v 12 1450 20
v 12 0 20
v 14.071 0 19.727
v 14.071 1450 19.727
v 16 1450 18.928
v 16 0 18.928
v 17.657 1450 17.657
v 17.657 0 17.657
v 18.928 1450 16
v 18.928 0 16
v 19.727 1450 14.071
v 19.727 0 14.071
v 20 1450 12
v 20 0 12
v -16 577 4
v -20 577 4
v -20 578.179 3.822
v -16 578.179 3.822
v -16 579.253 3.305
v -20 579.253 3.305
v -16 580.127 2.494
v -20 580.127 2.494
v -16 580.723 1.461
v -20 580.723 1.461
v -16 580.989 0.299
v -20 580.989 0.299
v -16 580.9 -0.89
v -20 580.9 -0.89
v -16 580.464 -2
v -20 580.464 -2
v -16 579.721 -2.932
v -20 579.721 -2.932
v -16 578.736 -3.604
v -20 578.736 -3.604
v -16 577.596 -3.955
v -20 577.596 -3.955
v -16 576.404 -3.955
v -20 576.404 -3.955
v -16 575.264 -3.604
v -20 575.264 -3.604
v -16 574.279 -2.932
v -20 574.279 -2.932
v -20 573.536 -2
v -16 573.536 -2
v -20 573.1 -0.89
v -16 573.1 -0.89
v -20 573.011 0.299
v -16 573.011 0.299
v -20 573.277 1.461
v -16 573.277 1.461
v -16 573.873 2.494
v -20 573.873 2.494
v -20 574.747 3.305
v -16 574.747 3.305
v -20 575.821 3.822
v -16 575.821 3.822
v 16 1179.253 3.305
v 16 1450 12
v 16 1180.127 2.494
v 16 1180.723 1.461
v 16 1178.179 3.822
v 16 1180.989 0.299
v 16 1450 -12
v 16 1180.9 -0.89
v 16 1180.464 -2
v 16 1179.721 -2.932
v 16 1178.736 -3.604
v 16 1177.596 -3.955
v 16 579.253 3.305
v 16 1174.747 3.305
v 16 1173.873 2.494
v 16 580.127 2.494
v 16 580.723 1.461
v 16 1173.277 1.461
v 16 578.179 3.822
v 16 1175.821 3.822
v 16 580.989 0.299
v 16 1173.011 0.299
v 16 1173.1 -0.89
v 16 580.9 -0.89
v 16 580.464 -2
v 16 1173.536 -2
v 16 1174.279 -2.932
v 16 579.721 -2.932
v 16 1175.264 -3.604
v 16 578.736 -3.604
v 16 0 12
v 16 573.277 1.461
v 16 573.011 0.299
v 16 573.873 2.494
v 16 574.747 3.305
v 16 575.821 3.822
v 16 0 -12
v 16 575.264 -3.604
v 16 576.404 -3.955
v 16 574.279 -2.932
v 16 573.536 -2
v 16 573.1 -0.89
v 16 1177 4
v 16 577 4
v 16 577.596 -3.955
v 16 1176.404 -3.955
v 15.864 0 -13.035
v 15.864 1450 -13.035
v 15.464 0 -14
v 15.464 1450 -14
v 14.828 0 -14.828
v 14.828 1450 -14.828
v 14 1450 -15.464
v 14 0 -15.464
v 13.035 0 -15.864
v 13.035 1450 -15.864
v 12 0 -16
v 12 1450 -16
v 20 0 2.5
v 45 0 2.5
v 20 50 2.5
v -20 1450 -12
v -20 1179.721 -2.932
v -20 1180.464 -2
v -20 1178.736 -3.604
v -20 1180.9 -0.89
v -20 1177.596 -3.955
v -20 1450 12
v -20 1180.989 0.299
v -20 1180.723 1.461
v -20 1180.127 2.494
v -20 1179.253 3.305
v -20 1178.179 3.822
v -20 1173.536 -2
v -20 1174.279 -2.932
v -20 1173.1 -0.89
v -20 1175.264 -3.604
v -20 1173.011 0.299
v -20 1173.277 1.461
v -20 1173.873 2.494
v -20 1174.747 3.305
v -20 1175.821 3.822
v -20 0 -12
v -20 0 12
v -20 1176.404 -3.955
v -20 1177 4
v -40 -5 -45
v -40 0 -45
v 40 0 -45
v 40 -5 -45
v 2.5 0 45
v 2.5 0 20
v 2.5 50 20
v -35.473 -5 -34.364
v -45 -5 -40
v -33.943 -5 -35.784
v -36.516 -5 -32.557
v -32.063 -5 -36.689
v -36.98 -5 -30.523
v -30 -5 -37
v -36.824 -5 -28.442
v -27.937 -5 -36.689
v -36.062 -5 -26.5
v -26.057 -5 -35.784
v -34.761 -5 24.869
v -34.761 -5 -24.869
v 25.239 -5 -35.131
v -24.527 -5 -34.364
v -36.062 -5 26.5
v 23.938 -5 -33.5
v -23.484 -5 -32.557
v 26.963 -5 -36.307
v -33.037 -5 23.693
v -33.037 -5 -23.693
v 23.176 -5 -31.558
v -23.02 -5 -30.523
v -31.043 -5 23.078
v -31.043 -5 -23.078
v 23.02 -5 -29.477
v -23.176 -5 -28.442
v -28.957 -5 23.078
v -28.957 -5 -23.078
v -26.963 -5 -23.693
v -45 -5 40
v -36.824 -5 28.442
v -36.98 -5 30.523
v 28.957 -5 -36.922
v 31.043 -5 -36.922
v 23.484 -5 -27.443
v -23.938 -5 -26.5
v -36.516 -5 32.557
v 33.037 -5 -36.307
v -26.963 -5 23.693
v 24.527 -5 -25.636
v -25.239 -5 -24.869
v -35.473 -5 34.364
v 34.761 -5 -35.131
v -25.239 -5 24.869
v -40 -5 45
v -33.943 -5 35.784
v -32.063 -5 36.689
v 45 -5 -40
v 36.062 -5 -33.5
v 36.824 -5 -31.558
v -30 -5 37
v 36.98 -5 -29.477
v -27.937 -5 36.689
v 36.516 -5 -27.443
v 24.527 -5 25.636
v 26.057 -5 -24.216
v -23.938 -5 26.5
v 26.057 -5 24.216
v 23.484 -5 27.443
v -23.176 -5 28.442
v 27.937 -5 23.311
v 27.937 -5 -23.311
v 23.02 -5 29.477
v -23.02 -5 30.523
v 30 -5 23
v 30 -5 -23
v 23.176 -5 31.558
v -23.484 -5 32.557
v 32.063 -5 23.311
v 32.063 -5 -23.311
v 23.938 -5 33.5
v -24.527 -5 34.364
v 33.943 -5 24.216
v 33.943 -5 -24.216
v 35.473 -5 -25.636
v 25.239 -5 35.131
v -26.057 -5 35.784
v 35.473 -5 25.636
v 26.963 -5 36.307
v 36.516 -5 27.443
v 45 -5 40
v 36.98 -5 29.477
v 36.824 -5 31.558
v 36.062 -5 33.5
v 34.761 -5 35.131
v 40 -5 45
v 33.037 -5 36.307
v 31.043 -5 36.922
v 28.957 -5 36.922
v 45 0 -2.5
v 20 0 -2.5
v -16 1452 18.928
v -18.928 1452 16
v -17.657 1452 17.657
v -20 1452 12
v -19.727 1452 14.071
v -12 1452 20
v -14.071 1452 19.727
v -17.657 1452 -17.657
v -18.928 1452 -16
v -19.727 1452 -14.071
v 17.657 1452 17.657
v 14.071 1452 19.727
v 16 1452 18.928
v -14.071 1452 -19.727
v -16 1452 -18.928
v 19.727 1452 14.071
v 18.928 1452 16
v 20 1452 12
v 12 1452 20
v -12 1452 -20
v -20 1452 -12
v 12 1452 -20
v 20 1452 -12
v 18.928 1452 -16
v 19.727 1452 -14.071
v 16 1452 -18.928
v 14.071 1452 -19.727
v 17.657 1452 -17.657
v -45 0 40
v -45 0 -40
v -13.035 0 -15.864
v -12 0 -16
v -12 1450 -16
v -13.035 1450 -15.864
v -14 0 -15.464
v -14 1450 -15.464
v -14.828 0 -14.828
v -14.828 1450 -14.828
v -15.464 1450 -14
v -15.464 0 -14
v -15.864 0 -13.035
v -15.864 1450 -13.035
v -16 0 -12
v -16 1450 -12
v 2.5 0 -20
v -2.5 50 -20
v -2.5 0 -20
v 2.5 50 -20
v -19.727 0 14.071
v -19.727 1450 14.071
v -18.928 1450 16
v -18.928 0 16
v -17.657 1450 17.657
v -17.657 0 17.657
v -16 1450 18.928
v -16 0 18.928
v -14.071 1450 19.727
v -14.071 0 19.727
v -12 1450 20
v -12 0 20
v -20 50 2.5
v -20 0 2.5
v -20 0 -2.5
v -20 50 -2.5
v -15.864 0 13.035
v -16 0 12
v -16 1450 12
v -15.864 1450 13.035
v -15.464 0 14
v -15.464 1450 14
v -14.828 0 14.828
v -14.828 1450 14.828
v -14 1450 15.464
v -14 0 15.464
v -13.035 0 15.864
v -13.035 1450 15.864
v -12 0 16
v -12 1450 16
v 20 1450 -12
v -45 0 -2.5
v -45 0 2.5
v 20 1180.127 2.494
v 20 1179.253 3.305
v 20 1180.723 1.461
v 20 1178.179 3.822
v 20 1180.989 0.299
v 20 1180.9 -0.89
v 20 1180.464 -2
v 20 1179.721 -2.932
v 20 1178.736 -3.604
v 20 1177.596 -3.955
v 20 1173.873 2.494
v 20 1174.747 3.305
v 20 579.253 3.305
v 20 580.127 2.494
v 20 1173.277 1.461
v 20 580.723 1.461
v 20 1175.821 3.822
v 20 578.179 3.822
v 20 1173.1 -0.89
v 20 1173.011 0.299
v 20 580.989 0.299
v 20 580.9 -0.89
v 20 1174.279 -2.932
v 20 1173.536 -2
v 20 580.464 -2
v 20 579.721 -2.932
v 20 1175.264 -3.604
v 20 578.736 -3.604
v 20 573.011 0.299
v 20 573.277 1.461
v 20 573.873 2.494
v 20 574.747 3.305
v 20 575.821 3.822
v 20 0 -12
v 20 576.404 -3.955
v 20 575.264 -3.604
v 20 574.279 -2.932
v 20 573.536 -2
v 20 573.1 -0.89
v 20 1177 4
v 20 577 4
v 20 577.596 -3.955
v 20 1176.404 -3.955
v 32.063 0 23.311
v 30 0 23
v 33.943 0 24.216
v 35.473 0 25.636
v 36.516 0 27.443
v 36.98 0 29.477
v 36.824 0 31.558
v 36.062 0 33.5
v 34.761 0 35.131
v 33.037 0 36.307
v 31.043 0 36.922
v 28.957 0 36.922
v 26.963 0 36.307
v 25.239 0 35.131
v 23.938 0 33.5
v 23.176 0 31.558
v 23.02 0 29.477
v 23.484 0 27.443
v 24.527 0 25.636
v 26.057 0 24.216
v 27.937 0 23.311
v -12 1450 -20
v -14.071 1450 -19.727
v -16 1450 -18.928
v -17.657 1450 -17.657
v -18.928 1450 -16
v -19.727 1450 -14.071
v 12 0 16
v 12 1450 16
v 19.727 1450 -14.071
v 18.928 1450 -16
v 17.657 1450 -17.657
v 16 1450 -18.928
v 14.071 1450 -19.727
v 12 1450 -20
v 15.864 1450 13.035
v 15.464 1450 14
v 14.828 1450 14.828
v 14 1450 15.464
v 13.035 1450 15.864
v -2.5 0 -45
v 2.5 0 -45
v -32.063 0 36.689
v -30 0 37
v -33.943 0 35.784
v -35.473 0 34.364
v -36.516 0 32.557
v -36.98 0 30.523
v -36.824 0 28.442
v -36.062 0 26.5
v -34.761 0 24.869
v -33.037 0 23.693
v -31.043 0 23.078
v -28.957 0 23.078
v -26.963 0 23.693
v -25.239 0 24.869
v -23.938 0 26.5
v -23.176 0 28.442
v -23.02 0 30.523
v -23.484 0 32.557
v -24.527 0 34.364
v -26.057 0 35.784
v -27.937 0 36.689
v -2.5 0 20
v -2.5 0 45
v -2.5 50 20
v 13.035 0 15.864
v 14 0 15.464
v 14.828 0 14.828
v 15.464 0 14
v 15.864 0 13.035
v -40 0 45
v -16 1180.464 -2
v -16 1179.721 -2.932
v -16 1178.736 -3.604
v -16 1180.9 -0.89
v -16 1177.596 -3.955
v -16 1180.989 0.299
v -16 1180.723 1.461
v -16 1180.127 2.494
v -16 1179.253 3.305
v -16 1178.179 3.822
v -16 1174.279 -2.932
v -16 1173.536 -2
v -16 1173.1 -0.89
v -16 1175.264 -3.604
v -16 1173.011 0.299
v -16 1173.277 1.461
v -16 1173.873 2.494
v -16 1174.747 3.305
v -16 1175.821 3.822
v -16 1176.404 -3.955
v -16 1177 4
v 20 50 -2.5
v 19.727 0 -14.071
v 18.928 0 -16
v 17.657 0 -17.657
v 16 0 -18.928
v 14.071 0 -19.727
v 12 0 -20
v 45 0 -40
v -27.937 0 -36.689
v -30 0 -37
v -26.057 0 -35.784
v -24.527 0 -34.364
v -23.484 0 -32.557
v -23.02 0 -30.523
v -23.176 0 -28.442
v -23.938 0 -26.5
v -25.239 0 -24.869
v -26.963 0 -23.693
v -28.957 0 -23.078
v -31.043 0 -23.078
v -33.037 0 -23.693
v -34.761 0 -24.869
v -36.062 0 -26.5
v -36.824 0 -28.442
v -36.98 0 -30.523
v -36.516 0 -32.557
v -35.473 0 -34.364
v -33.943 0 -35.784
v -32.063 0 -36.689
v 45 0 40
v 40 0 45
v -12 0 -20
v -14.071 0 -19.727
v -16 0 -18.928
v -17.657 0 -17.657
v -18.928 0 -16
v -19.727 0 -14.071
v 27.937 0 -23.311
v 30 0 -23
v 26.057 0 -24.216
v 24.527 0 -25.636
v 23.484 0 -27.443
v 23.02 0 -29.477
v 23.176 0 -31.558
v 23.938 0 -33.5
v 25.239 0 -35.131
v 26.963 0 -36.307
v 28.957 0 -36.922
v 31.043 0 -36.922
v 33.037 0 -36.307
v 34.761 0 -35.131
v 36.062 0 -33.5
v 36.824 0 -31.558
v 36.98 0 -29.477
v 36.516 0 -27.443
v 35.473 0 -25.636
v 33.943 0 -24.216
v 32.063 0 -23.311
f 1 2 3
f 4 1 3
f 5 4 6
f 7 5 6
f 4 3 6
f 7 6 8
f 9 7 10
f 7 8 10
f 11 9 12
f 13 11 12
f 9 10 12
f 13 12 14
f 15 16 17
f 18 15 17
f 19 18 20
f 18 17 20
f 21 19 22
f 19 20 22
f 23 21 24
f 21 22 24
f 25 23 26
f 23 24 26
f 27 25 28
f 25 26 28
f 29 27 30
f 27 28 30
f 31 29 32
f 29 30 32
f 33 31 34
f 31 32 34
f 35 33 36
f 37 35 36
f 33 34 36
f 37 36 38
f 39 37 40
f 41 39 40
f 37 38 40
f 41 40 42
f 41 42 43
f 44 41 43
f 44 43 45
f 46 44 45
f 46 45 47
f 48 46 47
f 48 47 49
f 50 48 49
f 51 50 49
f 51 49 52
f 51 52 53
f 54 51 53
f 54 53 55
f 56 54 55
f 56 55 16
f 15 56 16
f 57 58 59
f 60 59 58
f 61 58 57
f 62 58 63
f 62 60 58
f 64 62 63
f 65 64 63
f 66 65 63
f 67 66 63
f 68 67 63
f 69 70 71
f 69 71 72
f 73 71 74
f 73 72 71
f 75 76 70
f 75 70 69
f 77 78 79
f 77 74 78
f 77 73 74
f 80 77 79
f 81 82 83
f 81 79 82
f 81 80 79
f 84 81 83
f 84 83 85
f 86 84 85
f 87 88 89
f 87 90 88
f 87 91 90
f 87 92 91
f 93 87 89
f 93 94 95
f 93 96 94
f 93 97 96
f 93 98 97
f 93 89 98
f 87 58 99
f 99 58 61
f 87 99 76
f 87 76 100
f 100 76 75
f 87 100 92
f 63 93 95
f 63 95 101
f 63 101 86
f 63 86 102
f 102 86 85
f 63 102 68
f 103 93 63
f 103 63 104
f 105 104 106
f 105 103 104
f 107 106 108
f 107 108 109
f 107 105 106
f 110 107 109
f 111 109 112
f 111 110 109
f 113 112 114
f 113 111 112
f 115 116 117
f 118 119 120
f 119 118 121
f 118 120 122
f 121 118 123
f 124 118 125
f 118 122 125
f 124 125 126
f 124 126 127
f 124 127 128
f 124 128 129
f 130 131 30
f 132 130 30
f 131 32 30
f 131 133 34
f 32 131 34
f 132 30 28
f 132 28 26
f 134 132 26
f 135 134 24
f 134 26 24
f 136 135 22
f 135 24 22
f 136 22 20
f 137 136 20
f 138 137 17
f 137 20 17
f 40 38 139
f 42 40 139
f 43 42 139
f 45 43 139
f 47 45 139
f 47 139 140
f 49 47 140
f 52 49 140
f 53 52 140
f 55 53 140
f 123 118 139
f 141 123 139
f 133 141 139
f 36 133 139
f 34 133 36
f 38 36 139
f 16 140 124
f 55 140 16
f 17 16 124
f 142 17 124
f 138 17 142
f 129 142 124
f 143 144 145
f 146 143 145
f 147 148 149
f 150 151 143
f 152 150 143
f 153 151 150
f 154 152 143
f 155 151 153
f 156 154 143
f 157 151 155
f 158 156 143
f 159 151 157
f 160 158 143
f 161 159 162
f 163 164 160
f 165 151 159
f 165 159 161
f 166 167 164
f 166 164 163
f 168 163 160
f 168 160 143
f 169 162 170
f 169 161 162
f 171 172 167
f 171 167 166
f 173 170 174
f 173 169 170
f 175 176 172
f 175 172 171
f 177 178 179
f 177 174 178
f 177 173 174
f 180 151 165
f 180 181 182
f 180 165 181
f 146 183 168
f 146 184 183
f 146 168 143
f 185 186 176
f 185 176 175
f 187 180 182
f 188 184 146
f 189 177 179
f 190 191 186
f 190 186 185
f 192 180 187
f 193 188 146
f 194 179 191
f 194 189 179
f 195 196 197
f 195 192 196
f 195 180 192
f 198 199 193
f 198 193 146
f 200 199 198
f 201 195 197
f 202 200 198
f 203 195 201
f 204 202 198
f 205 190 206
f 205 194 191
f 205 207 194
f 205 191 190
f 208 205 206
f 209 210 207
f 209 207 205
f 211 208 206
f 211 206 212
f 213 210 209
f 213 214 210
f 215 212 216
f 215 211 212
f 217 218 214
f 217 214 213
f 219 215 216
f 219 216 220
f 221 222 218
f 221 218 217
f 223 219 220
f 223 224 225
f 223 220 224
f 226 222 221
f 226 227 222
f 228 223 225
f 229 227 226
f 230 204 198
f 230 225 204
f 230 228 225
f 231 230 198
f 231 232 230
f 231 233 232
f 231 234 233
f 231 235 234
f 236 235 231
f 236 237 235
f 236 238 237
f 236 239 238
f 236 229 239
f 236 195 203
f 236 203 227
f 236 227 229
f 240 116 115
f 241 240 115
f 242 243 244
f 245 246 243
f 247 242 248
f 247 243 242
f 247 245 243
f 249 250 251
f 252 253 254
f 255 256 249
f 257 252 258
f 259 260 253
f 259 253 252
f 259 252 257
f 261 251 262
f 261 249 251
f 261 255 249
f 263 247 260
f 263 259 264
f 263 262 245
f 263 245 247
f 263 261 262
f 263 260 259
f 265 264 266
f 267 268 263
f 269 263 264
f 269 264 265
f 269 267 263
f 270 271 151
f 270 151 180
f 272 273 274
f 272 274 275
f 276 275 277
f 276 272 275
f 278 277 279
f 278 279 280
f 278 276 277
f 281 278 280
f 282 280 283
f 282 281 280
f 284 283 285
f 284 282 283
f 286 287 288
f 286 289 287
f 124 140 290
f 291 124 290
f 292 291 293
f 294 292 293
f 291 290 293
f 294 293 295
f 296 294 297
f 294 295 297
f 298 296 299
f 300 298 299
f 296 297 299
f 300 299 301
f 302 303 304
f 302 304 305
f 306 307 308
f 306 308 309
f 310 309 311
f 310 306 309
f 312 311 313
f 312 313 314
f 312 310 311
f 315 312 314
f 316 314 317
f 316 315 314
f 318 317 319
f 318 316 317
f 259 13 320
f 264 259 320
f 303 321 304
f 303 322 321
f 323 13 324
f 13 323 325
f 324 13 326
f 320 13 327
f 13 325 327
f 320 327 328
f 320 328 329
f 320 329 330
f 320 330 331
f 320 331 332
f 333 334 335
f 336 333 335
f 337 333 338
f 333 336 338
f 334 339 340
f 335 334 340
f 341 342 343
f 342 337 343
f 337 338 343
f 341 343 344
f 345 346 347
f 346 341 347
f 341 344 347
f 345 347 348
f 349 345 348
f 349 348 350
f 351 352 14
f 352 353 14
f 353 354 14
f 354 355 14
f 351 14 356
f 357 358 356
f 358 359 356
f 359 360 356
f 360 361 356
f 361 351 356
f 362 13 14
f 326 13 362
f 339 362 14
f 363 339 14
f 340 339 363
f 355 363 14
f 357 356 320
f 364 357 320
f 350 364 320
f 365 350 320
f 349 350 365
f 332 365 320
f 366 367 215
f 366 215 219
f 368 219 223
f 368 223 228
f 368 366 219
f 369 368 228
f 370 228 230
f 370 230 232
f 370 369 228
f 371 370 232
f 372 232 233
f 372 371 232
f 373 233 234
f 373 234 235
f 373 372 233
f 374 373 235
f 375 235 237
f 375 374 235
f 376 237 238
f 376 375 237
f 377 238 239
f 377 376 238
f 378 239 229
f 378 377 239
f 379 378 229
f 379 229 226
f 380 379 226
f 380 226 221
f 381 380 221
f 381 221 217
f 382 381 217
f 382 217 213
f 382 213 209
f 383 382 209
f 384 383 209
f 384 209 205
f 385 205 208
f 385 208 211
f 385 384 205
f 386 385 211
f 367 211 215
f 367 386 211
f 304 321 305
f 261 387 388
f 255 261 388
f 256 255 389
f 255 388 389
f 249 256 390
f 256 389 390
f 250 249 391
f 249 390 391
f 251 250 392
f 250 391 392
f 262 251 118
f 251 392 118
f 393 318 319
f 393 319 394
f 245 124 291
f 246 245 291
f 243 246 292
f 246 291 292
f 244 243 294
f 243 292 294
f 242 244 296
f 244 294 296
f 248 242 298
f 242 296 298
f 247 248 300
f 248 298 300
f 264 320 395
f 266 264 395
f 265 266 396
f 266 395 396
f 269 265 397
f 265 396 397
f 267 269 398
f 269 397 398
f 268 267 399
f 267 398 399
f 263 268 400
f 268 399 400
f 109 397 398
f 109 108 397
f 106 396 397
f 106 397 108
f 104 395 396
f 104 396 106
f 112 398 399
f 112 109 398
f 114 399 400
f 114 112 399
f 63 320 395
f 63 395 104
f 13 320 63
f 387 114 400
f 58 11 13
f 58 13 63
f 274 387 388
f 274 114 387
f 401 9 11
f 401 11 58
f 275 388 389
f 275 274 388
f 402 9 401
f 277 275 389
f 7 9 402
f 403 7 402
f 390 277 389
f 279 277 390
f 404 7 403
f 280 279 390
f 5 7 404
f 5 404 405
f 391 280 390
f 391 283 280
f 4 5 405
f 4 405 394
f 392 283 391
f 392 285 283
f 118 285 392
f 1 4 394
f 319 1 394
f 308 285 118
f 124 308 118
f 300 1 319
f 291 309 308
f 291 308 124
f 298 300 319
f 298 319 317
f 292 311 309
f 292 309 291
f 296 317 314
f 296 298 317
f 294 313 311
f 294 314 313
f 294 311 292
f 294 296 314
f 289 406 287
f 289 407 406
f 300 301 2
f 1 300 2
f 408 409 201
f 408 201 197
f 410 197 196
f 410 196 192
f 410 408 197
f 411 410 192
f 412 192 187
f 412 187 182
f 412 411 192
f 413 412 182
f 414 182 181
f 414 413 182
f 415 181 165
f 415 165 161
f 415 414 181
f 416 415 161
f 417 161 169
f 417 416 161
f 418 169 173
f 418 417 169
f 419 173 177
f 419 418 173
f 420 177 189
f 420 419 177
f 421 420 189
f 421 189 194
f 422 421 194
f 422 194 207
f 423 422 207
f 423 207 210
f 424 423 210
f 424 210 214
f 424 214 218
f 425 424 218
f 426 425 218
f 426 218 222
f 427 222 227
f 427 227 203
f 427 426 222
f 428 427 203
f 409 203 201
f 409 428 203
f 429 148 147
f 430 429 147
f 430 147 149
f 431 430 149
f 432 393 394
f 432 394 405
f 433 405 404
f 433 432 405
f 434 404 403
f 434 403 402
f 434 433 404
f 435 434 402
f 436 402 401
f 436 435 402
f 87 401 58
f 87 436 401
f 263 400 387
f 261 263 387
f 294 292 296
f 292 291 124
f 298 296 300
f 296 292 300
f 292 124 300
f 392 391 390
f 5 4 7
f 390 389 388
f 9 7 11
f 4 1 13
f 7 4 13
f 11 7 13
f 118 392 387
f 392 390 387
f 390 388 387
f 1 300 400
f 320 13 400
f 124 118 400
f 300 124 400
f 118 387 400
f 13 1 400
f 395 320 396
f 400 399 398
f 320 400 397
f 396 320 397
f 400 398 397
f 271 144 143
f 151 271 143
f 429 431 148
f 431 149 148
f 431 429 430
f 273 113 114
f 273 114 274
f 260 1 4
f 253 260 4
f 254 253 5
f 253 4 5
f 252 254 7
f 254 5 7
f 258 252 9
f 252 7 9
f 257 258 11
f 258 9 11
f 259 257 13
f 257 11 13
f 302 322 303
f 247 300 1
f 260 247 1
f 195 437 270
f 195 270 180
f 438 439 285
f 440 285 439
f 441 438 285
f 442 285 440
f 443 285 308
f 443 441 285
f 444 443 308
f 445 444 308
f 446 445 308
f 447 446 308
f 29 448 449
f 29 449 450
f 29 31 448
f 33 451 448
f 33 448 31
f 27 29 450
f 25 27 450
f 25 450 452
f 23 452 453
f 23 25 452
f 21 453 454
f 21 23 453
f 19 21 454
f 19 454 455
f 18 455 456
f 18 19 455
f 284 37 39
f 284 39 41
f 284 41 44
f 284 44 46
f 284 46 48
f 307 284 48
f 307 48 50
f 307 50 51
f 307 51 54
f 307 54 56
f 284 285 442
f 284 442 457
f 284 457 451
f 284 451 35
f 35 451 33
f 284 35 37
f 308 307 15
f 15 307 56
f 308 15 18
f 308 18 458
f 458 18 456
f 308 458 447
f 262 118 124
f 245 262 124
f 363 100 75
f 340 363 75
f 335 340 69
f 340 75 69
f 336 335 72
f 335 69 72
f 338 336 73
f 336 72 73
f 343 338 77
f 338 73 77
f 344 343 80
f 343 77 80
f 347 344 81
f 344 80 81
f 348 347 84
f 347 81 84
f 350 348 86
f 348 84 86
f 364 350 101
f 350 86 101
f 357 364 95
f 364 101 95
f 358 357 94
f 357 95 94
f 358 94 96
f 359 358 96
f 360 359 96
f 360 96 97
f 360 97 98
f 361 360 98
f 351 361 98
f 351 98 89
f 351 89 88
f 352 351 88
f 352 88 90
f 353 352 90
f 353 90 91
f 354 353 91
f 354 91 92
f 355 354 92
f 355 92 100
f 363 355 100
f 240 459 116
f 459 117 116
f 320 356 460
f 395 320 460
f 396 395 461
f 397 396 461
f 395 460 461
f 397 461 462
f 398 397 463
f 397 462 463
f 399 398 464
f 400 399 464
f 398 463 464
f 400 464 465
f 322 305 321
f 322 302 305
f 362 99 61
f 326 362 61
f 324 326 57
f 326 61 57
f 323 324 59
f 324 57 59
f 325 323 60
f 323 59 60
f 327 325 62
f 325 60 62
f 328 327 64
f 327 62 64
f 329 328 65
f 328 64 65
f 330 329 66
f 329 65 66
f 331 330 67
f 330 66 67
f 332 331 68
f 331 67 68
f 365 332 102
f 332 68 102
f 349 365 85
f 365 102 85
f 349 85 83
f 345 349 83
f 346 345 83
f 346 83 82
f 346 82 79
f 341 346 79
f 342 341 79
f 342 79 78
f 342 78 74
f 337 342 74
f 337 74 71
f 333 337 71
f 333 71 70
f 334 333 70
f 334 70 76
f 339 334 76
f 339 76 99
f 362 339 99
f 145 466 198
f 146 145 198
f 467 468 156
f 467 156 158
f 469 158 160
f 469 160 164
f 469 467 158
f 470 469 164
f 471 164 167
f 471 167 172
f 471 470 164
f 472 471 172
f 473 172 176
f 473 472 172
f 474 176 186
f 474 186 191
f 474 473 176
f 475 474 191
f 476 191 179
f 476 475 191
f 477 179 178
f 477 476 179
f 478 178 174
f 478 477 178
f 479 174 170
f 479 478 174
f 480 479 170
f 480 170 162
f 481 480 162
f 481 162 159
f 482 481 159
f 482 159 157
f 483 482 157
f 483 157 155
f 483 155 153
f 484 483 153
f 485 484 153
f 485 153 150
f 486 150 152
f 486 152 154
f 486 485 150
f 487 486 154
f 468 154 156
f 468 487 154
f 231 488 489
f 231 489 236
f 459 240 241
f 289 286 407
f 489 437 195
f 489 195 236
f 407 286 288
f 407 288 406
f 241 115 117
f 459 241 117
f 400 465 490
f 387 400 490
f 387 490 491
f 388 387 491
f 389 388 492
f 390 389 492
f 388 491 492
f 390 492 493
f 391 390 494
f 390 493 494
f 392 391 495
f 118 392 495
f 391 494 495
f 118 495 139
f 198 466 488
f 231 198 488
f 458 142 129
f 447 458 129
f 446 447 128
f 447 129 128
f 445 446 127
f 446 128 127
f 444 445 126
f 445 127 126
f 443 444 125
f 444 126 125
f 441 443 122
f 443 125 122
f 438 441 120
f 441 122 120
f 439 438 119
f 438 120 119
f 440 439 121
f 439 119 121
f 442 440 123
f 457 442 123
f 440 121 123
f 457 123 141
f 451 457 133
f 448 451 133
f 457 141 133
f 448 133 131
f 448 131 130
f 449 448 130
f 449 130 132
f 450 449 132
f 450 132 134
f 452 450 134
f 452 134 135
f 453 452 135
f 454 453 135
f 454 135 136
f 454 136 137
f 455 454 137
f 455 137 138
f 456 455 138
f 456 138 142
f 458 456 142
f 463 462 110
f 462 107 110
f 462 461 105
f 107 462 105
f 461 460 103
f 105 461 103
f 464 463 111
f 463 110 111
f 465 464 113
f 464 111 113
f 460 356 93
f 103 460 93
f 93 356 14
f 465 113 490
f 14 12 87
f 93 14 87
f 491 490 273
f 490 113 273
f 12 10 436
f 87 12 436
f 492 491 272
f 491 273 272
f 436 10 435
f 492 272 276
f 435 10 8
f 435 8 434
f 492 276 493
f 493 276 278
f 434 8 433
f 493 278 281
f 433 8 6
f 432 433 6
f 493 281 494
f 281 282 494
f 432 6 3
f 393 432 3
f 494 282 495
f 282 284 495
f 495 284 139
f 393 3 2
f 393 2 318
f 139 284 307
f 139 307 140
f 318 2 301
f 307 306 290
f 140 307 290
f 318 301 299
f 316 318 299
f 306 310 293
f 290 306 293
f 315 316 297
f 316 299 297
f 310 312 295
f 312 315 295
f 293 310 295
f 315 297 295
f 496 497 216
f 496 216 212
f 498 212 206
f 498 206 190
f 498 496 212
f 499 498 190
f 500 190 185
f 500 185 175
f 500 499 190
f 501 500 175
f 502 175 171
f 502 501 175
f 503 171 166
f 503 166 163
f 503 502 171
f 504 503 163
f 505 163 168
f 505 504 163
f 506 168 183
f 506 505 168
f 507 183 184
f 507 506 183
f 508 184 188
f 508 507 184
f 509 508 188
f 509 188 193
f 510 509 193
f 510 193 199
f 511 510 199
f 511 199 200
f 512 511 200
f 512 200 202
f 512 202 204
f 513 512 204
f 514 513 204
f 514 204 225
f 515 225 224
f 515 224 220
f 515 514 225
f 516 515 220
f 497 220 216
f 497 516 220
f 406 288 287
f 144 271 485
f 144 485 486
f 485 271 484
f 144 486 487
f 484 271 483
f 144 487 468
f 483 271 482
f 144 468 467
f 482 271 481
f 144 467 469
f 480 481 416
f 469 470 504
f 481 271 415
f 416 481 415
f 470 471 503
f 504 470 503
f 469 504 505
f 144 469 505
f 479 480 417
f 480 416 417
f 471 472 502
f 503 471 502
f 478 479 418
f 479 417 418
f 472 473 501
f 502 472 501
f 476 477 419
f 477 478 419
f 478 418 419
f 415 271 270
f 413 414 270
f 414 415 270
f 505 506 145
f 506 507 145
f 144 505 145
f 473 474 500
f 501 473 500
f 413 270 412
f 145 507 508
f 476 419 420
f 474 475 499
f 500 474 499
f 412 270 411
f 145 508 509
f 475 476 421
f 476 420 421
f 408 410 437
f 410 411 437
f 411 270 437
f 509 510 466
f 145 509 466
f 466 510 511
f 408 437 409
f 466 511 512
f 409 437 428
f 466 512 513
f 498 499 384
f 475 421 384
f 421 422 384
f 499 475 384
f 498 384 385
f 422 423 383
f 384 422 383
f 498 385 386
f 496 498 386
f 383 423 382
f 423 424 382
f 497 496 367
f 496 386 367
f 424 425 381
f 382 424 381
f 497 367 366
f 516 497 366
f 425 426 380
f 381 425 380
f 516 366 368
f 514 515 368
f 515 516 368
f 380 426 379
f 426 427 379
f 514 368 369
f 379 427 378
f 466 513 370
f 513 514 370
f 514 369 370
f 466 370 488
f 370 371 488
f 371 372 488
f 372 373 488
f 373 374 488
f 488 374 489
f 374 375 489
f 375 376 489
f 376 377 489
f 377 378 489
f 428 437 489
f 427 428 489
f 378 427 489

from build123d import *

# Parameters (mm, degrees)
MEMBER_1_DEPTH      = 1450
SKETCH_3_W          = 90
SKETCH_3_H          = 90
SKETCH_3_R          = 7
EXTRUDE_1_DEPTH     = 5
CHAMFER_1_SIZE      = 5
EXTRUDE_2_DEPTH     = 2
SKETCH_5_R          = 4
CUT_EXTRUDE_1_DEPTH = 1455.150611182
EXTRUDE_3_DEPTH     = 2.5
EXTRUDE_3_2_DEPTH   = 2.5
EXTRUDE_4_DEPTH     = 2.5
EXTRUDE_4_2_DEPTH   = 2.5


with BuildPart() as part:
    # Sketch1 → Member 1 (new body)
    with BuildSketch(Plane(origin=(0, 0, 0), x_dir=(-1, 0, 0), z_dir=(0, 1, 0))):
        with BuildLine():
            Line((-12, -20), (12, -20))
            ThreePointArc((12, -20), (17.656854249, -17.656854249), (20, -12))
            Line((20, -12), (20, 12))
            ThreePointArc((20, 12), (17.656854249, 17.656854249), (12, 20))
            Line((12, 20), (-12, 20))
            ThreePointArc((-12, 20), (-17.656854249, 17.656854249), (-20, 12))
            Line((-20, 12), (-20, -12))
            ThreePointArc((-20, -12), (-17.656854249, -17.656854249), (-12, -20))
        make_face()
        with BuildLine():
            Line((-12, -16), (12, -16))
            ThreePointArc((12, -16), (14.828427125, -14.828427125), (16, -12))
            Line((16, -12), (16, 12))
            ThreePointArc((16, 12), (14.828427125, 14.828427125), (12, 16))
            Line((12, 16), (-12, 16))
            ThreePointArc((-12, 16), (-14.828427125, 14.828427125), (-16, 12))
            Line((-16, 12), (-16, -12))
            ThreePointArc((-16, -12), (-14.828427125, -14.828427125), (-12, -16))
        make_face(mode=Mode.SUBTRACT)
    extrude(amount=MEMBER_1_DEPTH)

    # 草图5 → 切除-拉伸1 (cut, through all)
    with BuildSketch(Plane.ZY.offset(20)):
        with Locations((0, -23)):
            Circle(SKETCH_5_R)
        with Locations((0, 577)):
            Circle(SKETCH_5_R)
        with Locations((0, 1177)):
            Circle(SKETCH_5_R)
    extrude(amount=-CUT_EXTRUDE_1_DEPTH, mode=Mode.SUBTRACT)


with BuildPart() as body_2:
    # 草图3 → 凸台-拉伸1 (new body)
    with BuildSketch(Plane.XZ):
        Rectangle(SKETCH_3_W, SKETCH_3_H)
        with Locations(Location((30, 30, 0), (0, 0, 270))):
            Circle(SKETCH_3_R, mode=Mode.SUBTRACT)
        with Locations(Location((30, -30, 0), (0, 0, 90))):
            Circle(SKETCH_3_R, mode=Mode.SUBTRACT)
        with Locations(Location((-30, 30, 0), (0, 0, 90))):
            Circle(SKETCH_3_R, mode=Mode.SUBTRACT)
        with Locations(Location((-30, -30, 0), (0, 0, 270))):
            Circle(SKETCH_3_R, mode=Mode.SUBTRACT)
    extrude(amount=EXTRUDE_1_DEPTH)

    # 倒角1
    chamfer_1_edges = [body_2.edges().sort_by_distance(p)[0] for p in [
        (-45, -2.5, 45),
        (45, -2.5, 45),
        (45, -2.5, -45),
        (-45, -2.5, -45),
    ]]
    chamfer(chamfer_1_edges, length=CHAMFER_1_SIZE)


with BuildPart() as body_3:
    # 草图4 → 凸台-拉伸2 (new body)
    with BuildSketch(Plane(origin=(0, 1450, 0), x_dir=(1, 0, 0), z_dir=(0, 1, 0))):
        with BuildLine():
            Line((-12, -20), (12, -20))
            ThreePointArc((12, -20), (17.656854249, -17.656854249), (20, -12))
            Line((20, -12), (20, 12))
            ThreePointArc((20, 12), (17.656854249, 17.656854249), (12, 20))
            Line((12, 20), (-12, 20))
            ThreePointArc((-12, 20), (-17.656854249, 17.656854249), (-20, 12))
            Line((-20, 12), (-20, -12))
            ThreePointArc((-20, -12), (-17.656854249, -17.656854249), (-12, -20))
        make_face()
    extrude(amount=EXTRUDE_2_DEPTH)


with BuildPart() as body_4:
    # 草图6 → 凸台-拉伸3 (new, symmetric)
    with BuildSketch(Plane.XY):
        Polygon((20, 0), (20, 50), (45, 0), align=None)
    extrude(amount=EXTRUDE_3_DEPTH, both=True)


with BuildPart() as body_5:
    # 草图6 → Extrude 3 2 (new, symmetric)
    with BuildSketch(Plane.XY):
        Polygon((-45, 0), (-20, 0), (-20, 50), align=None)
    extrude(amount=EXTRUDE_3_2_DEPTH, both=True)


with BuildPart() as body_6:
    # 草图7 → 凸台-拉伸4 (new, symmetric)
    with BuildSketch(Plane(origin=(0, 0, 0), x_dir=(0, 0, -1), z_dir=(1, 0, 0))):
        Polygon((20, 50), (20, 0), (45, 0), align=None)
    extrude(amount=EXTRUDE_4_DEPTH, both=True)


with BuildPart() as body_7:
    # 草图7 → Extrude 4 2 (new, symmetric)
    with BuildSketch(Plane(origin=(0, 0, 0), x_dir=(0, 0, -1), z_dir=(1, 0, 0))):
        Polygon((-45, 0), (-20, 50), (-20, 0), align=None)
    extrude(amount=EXTRUDE_4_2_DEPTH, both=True)


solid = Compound([part.part, body_2.part, body_3.part, body_4.part, body_5.part, body_6.part, body_7.part])
